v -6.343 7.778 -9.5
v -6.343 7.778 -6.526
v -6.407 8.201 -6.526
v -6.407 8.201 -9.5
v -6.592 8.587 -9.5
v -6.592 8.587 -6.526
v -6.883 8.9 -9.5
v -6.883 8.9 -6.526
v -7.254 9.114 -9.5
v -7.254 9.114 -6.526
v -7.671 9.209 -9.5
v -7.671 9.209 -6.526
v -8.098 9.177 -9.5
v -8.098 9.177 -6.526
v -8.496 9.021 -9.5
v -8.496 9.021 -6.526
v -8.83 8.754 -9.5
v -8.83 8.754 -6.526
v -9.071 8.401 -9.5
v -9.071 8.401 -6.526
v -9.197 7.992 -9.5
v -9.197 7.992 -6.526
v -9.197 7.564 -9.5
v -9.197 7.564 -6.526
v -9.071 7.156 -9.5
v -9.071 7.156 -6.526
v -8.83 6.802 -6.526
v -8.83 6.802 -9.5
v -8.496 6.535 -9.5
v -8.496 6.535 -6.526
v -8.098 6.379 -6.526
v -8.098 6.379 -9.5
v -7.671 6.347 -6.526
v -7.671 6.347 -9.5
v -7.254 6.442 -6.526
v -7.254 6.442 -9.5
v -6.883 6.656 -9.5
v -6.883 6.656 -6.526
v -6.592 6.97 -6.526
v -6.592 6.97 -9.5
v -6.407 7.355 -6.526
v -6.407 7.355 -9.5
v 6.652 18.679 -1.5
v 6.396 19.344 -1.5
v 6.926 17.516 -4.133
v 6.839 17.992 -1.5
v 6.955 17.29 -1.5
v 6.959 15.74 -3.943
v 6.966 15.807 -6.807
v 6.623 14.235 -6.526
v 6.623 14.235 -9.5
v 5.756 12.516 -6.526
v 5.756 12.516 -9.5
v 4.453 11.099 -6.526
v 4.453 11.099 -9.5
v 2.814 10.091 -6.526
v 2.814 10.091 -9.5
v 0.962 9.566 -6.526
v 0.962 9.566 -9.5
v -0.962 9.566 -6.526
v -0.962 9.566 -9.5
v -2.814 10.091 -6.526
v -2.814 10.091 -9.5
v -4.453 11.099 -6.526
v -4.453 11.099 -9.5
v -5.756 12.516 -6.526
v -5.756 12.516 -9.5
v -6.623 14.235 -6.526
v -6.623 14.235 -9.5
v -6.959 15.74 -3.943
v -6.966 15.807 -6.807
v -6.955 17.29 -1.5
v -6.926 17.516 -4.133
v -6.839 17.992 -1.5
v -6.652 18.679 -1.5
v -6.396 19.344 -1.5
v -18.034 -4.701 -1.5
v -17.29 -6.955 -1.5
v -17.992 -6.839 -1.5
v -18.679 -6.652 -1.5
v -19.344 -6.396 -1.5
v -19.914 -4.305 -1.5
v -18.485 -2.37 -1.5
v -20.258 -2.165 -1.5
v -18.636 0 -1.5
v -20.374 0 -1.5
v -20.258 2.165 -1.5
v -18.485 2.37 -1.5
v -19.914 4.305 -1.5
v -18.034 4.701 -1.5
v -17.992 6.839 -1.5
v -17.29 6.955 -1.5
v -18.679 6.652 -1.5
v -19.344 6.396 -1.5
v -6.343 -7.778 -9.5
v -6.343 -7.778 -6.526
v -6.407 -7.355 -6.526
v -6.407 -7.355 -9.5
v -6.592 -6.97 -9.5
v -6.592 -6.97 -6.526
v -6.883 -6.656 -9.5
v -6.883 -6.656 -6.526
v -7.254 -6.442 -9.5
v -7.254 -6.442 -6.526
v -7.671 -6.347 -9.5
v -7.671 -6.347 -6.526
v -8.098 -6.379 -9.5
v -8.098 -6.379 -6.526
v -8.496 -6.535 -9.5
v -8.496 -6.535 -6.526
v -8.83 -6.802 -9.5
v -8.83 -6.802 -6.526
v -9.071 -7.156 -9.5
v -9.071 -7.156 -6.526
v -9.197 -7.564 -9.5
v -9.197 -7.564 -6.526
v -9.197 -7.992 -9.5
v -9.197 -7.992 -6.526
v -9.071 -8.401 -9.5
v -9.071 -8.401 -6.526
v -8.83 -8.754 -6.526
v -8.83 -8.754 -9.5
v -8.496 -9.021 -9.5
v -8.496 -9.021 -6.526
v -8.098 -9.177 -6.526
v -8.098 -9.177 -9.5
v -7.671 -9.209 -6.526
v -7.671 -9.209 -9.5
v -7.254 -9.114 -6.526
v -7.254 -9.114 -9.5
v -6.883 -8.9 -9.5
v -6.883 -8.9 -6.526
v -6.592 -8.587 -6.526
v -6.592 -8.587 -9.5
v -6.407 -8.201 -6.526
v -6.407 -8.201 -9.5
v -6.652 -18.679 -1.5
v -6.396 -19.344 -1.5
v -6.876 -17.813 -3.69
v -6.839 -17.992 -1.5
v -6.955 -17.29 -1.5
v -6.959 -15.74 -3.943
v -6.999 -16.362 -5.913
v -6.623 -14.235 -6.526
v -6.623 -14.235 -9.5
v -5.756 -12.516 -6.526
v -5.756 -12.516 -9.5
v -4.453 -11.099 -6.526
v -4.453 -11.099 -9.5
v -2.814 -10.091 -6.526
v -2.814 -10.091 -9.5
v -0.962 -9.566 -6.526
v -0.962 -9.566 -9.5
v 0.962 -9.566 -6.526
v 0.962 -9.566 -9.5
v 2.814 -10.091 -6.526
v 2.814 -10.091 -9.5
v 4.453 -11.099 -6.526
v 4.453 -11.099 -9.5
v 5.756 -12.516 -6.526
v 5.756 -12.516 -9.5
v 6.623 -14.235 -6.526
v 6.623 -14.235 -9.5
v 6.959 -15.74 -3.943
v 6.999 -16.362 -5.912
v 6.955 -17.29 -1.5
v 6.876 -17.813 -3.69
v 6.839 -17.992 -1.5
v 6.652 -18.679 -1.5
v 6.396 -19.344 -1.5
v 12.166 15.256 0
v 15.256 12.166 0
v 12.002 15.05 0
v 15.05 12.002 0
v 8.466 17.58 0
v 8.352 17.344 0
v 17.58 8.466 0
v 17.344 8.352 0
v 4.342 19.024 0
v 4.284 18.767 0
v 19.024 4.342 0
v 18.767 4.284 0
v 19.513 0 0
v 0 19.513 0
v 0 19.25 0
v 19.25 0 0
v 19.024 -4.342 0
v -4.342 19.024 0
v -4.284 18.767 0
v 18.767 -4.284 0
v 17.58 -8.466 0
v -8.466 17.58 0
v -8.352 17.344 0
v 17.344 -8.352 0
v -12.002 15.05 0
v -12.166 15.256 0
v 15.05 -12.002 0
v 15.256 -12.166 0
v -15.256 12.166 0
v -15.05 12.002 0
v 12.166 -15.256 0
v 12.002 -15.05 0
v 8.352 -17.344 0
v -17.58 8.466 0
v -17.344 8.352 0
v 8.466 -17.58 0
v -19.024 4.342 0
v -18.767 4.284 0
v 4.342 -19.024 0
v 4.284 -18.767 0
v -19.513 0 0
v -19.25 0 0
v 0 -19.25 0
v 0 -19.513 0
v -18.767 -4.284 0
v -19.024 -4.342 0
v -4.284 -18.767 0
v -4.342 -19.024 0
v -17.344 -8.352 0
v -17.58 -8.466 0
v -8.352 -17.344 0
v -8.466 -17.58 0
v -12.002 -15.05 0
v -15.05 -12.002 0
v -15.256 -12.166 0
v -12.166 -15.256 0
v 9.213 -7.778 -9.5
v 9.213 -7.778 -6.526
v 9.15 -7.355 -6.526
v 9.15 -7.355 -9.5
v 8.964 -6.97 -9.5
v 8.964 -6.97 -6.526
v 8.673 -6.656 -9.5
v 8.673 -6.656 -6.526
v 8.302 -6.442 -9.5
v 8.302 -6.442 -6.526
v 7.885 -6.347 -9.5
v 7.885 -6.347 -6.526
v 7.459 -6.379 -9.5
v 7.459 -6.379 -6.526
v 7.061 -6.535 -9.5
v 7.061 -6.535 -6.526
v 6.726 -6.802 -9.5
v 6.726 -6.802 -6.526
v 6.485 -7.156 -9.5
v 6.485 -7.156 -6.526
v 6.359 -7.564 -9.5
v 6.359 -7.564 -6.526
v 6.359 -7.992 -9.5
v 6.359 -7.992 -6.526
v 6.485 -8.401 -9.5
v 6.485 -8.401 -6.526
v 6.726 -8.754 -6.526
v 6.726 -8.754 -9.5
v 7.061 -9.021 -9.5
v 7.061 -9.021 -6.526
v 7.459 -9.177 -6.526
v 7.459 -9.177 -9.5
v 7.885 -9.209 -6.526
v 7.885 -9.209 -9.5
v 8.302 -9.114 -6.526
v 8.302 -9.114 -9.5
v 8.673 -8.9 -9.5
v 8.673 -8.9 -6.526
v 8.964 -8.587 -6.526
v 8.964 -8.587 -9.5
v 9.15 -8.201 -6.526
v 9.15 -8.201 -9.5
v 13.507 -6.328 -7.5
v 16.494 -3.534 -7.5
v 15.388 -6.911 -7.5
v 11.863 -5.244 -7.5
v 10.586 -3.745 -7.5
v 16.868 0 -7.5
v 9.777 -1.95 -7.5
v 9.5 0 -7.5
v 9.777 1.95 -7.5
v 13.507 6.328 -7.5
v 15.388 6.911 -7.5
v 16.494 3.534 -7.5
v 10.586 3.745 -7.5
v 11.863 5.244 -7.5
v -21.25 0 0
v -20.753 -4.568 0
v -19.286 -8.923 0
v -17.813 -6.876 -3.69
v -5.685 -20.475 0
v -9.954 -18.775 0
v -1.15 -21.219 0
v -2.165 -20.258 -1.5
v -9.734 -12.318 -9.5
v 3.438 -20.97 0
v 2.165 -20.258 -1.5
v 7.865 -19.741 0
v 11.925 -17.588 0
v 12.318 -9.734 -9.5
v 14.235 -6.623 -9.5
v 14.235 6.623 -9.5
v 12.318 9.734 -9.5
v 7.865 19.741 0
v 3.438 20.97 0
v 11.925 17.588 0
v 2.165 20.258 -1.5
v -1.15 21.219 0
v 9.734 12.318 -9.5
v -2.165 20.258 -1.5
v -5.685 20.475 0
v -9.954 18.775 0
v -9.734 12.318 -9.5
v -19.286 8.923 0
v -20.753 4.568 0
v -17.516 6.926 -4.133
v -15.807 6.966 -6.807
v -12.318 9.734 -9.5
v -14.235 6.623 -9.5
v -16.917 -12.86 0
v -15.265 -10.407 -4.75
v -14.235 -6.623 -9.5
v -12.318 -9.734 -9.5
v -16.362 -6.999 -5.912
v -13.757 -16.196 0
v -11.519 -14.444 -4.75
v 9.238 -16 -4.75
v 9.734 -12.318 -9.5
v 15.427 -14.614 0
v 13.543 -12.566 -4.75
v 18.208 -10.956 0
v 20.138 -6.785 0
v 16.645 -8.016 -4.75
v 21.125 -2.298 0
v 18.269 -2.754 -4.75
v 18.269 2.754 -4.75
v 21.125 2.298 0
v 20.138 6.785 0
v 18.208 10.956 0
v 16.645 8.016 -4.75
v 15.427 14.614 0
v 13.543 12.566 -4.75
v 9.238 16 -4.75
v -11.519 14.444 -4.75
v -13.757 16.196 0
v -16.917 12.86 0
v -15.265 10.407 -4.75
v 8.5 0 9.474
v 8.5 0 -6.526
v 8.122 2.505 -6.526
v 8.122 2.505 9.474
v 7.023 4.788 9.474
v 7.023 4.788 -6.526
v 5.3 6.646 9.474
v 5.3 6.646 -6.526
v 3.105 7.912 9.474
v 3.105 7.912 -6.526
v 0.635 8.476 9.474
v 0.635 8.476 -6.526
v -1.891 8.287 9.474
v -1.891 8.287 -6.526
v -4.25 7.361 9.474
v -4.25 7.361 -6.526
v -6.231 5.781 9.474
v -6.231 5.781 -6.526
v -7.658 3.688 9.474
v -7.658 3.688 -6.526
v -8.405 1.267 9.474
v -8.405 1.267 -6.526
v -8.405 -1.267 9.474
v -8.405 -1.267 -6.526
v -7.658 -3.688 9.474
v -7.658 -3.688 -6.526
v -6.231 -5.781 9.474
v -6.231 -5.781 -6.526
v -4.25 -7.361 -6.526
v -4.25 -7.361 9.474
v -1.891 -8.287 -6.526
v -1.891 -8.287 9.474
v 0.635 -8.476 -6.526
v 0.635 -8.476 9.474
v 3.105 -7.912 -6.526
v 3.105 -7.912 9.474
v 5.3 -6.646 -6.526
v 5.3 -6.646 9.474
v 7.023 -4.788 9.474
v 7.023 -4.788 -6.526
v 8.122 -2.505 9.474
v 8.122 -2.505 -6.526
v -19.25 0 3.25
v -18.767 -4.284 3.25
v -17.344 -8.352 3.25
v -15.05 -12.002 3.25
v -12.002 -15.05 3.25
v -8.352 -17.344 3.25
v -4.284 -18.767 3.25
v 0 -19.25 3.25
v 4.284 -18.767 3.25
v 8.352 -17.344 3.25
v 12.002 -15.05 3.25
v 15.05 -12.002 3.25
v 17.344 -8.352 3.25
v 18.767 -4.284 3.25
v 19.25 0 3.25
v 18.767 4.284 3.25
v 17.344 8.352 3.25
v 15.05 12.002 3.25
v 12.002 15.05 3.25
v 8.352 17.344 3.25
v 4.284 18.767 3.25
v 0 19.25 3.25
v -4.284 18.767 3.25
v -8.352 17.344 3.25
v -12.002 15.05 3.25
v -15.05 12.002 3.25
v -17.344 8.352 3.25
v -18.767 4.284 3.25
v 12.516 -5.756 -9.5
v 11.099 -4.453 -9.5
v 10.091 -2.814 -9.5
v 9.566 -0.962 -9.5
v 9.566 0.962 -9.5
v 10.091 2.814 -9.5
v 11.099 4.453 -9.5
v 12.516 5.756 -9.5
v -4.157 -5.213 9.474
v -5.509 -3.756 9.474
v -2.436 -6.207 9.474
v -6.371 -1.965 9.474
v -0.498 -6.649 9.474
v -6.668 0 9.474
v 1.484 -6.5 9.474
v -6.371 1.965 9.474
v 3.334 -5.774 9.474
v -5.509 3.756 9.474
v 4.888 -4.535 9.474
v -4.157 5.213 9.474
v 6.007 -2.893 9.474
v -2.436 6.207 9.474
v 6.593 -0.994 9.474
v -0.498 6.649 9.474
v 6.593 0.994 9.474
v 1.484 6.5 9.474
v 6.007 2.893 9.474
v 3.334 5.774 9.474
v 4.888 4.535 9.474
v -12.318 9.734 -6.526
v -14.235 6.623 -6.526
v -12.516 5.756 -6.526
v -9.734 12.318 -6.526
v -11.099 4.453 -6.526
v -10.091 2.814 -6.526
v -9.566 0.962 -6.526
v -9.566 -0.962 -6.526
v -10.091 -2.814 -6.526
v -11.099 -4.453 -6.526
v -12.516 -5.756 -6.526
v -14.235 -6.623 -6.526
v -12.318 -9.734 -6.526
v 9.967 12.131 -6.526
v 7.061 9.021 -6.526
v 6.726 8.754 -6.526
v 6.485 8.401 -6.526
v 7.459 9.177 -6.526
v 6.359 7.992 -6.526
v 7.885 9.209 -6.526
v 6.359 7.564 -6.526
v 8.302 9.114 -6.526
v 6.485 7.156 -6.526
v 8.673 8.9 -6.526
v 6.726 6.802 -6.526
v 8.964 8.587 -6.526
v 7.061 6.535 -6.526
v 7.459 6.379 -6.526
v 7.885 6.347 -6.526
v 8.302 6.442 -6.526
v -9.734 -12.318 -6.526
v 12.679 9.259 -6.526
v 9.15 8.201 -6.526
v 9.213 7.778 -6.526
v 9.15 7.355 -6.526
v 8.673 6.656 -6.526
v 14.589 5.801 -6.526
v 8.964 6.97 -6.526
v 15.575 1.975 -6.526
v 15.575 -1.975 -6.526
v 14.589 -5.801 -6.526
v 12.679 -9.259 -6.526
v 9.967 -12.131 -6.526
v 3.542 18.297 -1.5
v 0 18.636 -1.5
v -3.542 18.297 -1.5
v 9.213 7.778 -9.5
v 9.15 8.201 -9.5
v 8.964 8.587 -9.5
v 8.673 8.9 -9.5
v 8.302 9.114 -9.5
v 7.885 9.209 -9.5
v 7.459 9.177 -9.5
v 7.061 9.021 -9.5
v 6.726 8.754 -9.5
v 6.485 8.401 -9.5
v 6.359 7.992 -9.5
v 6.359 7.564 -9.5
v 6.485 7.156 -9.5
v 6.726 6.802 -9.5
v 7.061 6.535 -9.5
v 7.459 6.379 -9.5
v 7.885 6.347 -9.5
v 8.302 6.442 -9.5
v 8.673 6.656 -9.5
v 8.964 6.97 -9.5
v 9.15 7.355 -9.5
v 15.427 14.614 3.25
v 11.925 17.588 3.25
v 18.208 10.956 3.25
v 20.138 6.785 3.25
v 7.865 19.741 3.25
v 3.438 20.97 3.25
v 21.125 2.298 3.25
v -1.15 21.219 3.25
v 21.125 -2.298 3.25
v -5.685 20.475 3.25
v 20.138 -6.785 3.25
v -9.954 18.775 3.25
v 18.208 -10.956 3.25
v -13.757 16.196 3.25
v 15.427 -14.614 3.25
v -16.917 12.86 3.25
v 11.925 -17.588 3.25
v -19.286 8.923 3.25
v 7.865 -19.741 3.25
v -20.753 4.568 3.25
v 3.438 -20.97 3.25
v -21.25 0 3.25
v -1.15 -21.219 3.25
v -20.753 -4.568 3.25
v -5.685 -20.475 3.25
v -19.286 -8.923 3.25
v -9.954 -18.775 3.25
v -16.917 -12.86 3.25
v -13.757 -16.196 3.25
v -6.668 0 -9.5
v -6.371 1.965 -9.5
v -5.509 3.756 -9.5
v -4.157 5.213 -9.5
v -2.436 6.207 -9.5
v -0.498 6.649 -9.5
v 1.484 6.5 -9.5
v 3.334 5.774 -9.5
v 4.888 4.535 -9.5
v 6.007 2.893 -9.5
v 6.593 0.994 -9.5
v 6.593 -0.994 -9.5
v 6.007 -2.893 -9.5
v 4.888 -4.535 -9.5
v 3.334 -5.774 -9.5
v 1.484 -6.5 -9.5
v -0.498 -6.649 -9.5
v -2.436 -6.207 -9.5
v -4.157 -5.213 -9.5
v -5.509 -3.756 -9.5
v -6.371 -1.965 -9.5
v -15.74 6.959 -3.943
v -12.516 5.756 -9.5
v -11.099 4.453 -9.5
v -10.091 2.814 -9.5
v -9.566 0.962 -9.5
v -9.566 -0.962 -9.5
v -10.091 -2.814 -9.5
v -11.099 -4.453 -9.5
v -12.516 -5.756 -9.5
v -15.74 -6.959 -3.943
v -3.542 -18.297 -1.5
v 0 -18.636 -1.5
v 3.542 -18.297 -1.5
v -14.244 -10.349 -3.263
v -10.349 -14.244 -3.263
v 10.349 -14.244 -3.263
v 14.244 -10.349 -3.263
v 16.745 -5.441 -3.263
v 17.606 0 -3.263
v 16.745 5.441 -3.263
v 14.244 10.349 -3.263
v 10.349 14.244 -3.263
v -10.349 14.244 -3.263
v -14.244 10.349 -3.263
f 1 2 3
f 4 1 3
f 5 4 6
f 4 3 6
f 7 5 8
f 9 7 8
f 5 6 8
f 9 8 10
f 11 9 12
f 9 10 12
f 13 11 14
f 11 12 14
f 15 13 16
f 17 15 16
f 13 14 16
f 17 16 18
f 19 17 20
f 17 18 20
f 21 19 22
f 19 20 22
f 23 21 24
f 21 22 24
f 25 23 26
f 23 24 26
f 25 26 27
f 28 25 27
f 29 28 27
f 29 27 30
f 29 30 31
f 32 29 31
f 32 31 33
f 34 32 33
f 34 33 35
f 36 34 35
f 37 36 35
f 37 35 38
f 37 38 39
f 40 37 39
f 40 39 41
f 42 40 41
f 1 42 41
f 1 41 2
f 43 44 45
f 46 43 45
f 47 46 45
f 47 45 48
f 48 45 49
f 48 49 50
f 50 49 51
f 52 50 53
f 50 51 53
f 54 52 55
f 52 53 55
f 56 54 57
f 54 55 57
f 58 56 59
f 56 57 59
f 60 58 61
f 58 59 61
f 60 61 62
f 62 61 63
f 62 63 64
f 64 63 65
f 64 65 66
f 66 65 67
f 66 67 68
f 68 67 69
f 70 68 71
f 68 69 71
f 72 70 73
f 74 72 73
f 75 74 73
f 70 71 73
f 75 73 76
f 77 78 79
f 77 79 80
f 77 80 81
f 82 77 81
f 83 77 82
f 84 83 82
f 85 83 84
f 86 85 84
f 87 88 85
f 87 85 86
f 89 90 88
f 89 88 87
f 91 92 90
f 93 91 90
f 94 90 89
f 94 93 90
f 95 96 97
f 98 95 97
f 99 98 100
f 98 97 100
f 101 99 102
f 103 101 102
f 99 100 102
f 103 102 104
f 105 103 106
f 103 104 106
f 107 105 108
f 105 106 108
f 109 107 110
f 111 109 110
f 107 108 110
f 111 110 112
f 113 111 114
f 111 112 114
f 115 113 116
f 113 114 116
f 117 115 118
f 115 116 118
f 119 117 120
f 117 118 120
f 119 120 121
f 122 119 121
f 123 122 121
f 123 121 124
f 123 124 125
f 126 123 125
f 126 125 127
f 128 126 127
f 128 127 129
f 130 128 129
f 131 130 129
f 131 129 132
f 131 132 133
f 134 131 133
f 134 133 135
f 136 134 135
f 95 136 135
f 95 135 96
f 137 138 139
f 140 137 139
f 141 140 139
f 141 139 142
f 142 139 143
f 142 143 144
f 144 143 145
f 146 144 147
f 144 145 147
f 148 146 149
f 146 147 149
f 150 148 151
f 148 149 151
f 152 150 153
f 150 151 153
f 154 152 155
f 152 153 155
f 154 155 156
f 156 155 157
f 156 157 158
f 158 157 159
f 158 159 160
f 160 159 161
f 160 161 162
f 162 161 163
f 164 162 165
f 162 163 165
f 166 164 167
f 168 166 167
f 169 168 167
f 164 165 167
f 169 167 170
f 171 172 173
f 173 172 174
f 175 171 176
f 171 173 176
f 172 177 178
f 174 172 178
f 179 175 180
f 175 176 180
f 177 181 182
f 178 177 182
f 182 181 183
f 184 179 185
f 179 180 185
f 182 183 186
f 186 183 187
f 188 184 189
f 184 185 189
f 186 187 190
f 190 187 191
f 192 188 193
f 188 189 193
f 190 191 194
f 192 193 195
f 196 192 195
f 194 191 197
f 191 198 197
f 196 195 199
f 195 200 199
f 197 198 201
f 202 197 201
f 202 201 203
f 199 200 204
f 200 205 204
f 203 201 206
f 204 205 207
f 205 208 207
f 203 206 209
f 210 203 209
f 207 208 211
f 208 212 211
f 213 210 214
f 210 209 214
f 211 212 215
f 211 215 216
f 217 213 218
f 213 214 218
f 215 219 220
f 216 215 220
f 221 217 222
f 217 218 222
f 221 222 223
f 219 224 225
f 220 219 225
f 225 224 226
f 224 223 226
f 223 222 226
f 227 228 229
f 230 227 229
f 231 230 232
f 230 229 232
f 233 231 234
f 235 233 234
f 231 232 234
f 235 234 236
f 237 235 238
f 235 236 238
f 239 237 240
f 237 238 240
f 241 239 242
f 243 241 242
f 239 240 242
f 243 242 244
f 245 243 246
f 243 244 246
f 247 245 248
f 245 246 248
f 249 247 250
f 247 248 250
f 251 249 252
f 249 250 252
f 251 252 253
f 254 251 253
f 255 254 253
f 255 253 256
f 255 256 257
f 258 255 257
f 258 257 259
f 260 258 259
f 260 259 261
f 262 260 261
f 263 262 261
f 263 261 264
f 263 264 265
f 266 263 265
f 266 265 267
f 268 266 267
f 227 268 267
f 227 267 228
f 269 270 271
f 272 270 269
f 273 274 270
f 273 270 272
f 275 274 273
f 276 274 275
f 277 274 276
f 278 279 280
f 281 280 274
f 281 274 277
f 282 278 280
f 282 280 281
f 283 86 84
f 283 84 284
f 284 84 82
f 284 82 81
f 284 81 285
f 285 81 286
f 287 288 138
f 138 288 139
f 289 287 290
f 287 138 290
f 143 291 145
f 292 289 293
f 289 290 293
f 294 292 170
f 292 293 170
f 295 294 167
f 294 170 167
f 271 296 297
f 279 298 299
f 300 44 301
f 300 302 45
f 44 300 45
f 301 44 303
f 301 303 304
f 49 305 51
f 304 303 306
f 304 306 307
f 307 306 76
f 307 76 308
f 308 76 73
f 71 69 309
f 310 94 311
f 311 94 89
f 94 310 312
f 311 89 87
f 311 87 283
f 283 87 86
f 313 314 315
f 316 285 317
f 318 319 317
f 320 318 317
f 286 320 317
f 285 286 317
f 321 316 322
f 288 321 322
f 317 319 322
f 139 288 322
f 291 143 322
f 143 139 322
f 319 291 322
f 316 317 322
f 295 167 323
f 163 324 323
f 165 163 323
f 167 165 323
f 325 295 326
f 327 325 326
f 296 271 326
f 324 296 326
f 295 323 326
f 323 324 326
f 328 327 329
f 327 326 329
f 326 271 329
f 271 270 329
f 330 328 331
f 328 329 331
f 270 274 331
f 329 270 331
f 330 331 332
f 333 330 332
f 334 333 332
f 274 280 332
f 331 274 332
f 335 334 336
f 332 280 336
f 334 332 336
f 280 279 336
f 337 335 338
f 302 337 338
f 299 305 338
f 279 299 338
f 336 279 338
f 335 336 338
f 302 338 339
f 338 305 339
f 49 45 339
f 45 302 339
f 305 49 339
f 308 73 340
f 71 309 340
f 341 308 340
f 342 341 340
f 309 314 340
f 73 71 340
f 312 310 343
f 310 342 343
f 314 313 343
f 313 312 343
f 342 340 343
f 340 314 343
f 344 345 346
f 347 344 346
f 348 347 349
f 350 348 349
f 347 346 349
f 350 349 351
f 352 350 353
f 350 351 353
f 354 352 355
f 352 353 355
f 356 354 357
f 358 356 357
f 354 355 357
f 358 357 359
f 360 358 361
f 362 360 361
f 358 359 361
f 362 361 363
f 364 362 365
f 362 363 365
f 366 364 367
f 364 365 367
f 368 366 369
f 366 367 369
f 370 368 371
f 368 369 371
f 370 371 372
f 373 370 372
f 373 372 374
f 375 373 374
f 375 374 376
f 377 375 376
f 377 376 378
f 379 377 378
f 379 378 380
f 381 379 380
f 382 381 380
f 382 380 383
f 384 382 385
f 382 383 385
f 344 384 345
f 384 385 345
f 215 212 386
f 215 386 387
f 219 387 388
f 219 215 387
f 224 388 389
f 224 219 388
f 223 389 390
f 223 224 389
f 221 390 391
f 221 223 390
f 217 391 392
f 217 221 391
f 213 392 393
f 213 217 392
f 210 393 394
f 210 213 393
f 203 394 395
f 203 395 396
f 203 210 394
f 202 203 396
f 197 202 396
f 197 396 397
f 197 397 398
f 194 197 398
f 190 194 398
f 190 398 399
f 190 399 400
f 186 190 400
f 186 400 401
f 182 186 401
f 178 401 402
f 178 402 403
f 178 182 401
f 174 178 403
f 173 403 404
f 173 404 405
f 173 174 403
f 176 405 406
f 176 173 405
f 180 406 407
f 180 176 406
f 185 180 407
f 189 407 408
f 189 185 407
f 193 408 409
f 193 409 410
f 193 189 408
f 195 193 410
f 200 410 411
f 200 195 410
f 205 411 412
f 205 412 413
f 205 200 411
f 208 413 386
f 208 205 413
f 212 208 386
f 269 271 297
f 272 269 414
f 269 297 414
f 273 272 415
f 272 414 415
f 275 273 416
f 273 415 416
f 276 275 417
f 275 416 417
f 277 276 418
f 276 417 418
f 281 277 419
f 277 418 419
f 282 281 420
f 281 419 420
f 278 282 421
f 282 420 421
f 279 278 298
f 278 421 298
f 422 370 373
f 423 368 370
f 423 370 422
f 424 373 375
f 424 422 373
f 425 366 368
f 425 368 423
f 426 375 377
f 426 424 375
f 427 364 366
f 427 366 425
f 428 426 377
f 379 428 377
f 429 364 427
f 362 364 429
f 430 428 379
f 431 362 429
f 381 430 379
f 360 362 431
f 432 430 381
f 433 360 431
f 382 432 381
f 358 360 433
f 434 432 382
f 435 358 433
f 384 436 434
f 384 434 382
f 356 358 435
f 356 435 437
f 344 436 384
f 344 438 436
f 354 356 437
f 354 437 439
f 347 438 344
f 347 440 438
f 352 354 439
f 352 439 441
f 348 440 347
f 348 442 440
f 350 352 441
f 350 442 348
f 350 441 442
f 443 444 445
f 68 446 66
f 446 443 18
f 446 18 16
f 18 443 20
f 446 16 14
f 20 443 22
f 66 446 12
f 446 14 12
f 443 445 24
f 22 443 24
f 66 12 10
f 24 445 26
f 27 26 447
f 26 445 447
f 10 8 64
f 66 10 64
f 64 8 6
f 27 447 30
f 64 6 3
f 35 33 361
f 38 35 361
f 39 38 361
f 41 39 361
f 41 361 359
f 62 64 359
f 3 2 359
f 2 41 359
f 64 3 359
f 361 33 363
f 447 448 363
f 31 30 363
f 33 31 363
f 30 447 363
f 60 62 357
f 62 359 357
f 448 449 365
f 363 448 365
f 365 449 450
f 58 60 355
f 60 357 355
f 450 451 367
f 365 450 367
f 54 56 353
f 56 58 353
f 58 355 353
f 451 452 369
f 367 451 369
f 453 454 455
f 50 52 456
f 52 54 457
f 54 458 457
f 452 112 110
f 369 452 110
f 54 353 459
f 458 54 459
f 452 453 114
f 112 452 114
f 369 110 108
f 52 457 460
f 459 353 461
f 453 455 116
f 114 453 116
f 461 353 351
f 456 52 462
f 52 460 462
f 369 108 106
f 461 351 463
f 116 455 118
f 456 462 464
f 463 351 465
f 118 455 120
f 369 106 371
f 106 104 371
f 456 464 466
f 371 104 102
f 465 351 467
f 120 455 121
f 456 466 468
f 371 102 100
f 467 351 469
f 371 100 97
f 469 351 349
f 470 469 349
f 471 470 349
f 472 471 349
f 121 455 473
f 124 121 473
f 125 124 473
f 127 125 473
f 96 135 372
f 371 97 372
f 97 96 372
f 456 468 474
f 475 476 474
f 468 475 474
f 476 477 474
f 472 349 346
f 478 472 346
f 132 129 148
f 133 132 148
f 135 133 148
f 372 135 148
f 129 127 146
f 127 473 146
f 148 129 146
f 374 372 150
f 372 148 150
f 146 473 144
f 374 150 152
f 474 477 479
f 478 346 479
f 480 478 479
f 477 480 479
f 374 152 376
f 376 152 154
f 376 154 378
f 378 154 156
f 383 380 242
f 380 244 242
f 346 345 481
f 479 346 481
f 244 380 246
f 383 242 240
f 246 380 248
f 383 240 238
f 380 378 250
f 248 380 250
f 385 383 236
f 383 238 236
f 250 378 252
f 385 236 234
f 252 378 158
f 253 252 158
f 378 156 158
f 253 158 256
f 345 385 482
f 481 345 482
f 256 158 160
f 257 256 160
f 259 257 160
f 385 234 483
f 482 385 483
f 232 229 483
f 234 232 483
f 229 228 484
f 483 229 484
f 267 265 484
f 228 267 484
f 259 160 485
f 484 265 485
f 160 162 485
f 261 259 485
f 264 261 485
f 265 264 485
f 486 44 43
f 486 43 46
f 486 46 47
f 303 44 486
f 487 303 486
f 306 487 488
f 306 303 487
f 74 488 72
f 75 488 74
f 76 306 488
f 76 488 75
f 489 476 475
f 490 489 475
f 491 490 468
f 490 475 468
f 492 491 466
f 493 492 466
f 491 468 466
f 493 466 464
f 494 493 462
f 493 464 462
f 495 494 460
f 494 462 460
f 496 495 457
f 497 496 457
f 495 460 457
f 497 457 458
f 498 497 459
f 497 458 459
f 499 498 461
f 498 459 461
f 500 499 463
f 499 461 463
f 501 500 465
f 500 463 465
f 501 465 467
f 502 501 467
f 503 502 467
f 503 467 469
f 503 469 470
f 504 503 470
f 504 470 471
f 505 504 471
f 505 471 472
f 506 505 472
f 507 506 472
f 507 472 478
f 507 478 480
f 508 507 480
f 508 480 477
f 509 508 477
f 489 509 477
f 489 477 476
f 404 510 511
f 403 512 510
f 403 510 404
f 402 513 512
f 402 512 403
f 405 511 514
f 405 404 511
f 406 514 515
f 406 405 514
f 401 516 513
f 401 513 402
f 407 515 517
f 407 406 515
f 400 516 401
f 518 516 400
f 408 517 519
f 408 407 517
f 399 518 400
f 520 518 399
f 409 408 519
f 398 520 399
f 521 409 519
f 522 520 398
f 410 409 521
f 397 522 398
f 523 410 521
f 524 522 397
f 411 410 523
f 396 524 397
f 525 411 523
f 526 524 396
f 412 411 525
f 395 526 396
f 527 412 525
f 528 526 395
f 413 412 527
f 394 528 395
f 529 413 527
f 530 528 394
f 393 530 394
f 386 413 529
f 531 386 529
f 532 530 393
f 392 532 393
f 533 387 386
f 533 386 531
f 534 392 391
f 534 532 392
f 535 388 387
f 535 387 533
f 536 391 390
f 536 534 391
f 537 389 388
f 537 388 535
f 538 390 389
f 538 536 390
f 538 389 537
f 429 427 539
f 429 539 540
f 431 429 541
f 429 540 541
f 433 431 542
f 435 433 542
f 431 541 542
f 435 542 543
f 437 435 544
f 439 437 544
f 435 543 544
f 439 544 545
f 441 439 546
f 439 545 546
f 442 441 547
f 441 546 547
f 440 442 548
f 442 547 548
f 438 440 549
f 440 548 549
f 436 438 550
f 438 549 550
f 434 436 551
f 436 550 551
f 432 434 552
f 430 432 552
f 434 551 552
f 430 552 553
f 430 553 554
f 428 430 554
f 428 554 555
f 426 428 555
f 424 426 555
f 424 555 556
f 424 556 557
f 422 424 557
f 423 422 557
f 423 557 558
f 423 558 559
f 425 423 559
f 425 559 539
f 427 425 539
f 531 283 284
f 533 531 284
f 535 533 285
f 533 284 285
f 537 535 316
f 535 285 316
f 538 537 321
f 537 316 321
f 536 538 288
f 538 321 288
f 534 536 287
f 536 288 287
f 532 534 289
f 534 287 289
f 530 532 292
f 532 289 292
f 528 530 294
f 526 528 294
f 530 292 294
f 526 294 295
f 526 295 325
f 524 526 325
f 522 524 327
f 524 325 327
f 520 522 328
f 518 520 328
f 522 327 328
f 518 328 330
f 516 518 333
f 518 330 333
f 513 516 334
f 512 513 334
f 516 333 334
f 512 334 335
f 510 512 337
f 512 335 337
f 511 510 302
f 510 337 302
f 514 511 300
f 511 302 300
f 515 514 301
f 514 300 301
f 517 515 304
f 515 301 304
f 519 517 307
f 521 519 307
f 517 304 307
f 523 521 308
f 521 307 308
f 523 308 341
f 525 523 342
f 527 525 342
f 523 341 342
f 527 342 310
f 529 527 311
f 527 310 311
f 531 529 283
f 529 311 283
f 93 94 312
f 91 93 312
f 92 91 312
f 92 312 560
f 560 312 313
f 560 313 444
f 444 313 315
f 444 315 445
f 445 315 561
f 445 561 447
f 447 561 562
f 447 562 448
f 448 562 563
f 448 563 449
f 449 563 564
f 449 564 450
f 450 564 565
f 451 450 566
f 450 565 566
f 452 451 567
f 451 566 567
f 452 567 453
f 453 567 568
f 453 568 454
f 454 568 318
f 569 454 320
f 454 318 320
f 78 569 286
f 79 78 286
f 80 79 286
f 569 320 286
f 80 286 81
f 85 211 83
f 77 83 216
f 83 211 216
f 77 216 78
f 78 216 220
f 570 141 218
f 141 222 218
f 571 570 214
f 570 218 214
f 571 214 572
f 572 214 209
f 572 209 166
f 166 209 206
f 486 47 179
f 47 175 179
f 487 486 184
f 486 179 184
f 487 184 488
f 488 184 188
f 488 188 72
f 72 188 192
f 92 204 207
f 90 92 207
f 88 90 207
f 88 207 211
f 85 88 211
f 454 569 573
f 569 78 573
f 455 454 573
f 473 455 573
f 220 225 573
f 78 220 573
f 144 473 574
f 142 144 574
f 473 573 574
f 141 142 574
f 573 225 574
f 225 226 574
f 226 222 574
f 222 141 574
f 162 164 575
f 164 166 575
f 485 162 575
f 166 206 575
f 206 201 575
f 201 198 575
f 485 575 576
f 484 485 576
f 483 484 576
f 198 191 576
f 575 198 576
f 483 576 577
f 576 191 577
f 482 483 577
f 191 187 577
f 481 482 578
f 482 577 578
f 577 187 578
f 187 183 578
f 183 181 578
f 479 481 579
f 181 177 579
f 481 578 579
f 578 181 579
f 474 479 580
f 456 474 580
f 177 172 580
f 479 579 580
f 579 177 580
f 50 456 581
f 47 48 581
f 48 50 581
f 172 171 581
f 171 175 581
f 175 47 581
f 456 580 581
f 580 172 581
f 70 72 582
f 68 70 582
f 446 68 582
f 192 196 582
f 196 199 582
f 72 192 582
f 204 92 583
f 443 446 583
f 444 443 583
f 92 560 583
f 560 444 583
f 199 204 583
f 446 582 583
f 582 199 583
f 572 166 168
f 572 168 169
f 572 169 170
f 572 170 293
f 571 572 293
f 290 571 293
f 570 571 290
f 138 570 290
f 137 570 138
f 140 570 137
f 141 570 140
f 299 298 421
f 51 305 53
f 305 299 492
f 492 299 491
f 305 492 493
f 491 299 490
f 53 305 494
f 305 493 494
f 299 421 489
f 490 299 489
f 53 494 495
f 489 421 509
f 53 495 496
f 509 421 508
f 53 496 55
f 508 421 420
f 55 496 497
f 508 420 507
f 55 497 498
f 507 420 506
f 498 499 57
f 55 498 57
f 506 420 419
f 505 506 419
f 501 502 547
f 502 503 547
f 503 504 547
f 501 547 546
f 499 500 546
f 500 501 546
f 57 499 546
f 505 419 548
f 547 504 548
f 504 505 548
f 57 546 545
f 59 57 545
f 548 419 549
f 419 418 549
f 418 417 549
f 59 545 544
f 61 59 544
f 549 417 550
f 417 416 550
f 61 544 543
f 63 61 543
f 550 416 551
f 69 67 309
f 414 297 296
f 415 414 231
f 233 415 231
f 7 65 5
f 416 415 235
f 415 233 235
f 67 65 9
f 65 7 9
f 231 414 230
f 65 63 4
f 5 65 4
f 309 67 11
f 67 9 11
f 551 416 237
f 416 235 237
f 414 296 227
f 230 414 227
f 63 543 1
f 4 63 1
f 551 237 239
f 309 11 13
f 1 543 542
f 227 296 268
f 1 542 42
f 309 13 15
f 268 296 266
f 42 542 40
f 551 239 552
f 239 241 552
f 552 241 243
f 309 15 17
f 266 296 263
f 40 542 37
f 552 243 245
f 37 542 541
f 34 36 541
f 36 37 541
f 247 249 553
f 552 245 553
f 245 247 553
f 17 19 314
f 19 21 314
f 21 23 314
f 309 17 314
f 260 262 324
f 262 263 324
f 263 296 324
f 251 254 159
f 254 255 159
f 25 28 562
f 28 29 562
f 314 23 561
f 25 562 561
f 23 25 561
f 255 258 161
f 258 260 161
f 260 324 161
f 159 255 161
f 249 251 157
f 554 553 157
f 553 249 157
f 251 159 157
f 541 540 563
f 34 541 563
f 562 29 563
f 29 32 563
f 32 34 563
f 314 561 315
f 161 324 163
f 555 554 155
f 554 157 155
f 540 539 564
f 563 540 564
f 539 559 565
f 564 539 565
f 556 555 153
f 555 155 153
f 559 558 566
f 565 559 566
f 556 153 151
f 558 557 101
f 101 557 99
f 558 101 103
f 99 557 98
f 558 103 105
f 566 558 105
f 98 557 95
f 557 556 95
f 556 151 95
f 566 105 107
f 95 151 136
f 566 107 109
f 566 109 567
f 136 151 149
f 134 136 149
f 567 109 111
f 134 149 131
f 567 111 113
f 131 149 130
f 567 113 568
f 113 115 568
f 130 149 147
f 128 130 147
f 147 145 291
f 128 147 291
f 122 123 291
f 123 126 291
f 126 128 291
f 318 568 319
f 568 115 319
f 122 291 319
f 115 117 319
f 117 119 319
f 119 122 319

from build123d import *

# Parameters (mm, degrees)
SKETCH1_R                   = 21.25
SKETCH1_R_2                 = 19.25
BOSS_EXTRUDE1_DEPTH         = 3.25
SKETCH4_R                   = 7
CUT_EXTRUDE2_DEPTH          = 8
SKETCH5_R                   = 7
CUT_EXTRUDE3_DEPTH          = 2
SKETCH7_R                   = 8.5
BOSS_EXTRUDE2_DEPTH         = 16
SKETCH6_R                   = 6.6675
CUT_EXTRUDE5_DEPTH          = 36.540444334
F_33_0_113_DIAMETER_HOLE1_D = 2.8702


with BuildPart() as part:
    # Sketch1 → Boss-Extrude1 (new body)
    with BuildSketch(Plane.XY):
        with Locations(Location((0, 0, 0), (0, 0, 180))):
            Circle(SKETCH1_R)
        with Locations(Location((0, 0, 0), (0, 0, 180))):
            Circle(SKETCH1_R_2, mode=Mode.SUBTRACT)
    extrude(amount=BOSS_EXTRUDE1_DEPTH)

    # Sketch2 → Revolve1 (revolve)
    with BuildSketch(Plane(origin=(0, 0, 0), x_dir=(1, 0, 0), z_dir=(0, 1, 0))):
        Polygon((-21.25, 0), (-15.7, 9.5), (0, 9.5), (0, 6.526382134), (-15.7, 6.526382134), (-19.512781141, 0), align=None)
    revolve(axis=Axis((0, 0, -9.5), (0, 0, 1)))

    # Sketch4 → Cut-Extrude2 (cut)
    with BuildSketch(Plane(origin=(0, 0, -9.5), x_dir=(-1, 0, 0), z_dir=(0, 0, -1))):
        with Locations((0, 16.5)):
            Circle(SKETCH4_R)
        with Locations((16.5, 0)):
            Circle(SKETCH4_R)
        with Locations((0, -16.5)):
            Circle(SKETCH4_R)
    extrude(amount=-CUT_EXTRUDE2_DEPTH, mode=Mode.SUBTRACT)

    # Sketch5 → Cut-Extrude3 (cut)
    with BuildSketch(Plane(origin=(0, 0, -9.5), x_dir=(-1, 0, 0), z_dir=(0, 0, -1))):
        with Locations((-16.5, 0)):
            Circle(SKETCH5_R)
    extrude(amount=-CUT_EXTRUDE3_DEPTH, mode=Mode.SUBTRACT)

    # Sketch7 → Boss-Extrude2 (add)
    with BuildSketch(Plane.XY.offset(-6.526382134)):
        Circle(SKETCH7_R)
    extrude(amount=BOSS_EXTRUDE2_DEPTH)

    # Sketch6 → Cut-Extrude5 (cut, through all)
    with BuildSketch(Plane(origin=(0, 0, -9.5), x_dir=(-1, 0, 0), z_dir=(0, 0, -1))):
        Circle(SKETCH6_R)
    extrude(amount=-CUT_EXTRUDE5_DEPTH, mode=Mode.SUBTRACT)

    # #33 (0.113) Diameter Hole1 (through all)
    with Locations(Plane(origin=(0, 0, -9.5), x_dir=(-1, 0, 0), z_dir=(0, 0, -1))):
        with Locations((7.778174593, 7.778174593), (7.778174593, -7.778174593), (-7.778174593, -7.778174593), (-7.778174593, 7.778174593)):
            Hole(F_33_0_113_DIAMETER_HOLE1_D / 2)


solid = part.part
